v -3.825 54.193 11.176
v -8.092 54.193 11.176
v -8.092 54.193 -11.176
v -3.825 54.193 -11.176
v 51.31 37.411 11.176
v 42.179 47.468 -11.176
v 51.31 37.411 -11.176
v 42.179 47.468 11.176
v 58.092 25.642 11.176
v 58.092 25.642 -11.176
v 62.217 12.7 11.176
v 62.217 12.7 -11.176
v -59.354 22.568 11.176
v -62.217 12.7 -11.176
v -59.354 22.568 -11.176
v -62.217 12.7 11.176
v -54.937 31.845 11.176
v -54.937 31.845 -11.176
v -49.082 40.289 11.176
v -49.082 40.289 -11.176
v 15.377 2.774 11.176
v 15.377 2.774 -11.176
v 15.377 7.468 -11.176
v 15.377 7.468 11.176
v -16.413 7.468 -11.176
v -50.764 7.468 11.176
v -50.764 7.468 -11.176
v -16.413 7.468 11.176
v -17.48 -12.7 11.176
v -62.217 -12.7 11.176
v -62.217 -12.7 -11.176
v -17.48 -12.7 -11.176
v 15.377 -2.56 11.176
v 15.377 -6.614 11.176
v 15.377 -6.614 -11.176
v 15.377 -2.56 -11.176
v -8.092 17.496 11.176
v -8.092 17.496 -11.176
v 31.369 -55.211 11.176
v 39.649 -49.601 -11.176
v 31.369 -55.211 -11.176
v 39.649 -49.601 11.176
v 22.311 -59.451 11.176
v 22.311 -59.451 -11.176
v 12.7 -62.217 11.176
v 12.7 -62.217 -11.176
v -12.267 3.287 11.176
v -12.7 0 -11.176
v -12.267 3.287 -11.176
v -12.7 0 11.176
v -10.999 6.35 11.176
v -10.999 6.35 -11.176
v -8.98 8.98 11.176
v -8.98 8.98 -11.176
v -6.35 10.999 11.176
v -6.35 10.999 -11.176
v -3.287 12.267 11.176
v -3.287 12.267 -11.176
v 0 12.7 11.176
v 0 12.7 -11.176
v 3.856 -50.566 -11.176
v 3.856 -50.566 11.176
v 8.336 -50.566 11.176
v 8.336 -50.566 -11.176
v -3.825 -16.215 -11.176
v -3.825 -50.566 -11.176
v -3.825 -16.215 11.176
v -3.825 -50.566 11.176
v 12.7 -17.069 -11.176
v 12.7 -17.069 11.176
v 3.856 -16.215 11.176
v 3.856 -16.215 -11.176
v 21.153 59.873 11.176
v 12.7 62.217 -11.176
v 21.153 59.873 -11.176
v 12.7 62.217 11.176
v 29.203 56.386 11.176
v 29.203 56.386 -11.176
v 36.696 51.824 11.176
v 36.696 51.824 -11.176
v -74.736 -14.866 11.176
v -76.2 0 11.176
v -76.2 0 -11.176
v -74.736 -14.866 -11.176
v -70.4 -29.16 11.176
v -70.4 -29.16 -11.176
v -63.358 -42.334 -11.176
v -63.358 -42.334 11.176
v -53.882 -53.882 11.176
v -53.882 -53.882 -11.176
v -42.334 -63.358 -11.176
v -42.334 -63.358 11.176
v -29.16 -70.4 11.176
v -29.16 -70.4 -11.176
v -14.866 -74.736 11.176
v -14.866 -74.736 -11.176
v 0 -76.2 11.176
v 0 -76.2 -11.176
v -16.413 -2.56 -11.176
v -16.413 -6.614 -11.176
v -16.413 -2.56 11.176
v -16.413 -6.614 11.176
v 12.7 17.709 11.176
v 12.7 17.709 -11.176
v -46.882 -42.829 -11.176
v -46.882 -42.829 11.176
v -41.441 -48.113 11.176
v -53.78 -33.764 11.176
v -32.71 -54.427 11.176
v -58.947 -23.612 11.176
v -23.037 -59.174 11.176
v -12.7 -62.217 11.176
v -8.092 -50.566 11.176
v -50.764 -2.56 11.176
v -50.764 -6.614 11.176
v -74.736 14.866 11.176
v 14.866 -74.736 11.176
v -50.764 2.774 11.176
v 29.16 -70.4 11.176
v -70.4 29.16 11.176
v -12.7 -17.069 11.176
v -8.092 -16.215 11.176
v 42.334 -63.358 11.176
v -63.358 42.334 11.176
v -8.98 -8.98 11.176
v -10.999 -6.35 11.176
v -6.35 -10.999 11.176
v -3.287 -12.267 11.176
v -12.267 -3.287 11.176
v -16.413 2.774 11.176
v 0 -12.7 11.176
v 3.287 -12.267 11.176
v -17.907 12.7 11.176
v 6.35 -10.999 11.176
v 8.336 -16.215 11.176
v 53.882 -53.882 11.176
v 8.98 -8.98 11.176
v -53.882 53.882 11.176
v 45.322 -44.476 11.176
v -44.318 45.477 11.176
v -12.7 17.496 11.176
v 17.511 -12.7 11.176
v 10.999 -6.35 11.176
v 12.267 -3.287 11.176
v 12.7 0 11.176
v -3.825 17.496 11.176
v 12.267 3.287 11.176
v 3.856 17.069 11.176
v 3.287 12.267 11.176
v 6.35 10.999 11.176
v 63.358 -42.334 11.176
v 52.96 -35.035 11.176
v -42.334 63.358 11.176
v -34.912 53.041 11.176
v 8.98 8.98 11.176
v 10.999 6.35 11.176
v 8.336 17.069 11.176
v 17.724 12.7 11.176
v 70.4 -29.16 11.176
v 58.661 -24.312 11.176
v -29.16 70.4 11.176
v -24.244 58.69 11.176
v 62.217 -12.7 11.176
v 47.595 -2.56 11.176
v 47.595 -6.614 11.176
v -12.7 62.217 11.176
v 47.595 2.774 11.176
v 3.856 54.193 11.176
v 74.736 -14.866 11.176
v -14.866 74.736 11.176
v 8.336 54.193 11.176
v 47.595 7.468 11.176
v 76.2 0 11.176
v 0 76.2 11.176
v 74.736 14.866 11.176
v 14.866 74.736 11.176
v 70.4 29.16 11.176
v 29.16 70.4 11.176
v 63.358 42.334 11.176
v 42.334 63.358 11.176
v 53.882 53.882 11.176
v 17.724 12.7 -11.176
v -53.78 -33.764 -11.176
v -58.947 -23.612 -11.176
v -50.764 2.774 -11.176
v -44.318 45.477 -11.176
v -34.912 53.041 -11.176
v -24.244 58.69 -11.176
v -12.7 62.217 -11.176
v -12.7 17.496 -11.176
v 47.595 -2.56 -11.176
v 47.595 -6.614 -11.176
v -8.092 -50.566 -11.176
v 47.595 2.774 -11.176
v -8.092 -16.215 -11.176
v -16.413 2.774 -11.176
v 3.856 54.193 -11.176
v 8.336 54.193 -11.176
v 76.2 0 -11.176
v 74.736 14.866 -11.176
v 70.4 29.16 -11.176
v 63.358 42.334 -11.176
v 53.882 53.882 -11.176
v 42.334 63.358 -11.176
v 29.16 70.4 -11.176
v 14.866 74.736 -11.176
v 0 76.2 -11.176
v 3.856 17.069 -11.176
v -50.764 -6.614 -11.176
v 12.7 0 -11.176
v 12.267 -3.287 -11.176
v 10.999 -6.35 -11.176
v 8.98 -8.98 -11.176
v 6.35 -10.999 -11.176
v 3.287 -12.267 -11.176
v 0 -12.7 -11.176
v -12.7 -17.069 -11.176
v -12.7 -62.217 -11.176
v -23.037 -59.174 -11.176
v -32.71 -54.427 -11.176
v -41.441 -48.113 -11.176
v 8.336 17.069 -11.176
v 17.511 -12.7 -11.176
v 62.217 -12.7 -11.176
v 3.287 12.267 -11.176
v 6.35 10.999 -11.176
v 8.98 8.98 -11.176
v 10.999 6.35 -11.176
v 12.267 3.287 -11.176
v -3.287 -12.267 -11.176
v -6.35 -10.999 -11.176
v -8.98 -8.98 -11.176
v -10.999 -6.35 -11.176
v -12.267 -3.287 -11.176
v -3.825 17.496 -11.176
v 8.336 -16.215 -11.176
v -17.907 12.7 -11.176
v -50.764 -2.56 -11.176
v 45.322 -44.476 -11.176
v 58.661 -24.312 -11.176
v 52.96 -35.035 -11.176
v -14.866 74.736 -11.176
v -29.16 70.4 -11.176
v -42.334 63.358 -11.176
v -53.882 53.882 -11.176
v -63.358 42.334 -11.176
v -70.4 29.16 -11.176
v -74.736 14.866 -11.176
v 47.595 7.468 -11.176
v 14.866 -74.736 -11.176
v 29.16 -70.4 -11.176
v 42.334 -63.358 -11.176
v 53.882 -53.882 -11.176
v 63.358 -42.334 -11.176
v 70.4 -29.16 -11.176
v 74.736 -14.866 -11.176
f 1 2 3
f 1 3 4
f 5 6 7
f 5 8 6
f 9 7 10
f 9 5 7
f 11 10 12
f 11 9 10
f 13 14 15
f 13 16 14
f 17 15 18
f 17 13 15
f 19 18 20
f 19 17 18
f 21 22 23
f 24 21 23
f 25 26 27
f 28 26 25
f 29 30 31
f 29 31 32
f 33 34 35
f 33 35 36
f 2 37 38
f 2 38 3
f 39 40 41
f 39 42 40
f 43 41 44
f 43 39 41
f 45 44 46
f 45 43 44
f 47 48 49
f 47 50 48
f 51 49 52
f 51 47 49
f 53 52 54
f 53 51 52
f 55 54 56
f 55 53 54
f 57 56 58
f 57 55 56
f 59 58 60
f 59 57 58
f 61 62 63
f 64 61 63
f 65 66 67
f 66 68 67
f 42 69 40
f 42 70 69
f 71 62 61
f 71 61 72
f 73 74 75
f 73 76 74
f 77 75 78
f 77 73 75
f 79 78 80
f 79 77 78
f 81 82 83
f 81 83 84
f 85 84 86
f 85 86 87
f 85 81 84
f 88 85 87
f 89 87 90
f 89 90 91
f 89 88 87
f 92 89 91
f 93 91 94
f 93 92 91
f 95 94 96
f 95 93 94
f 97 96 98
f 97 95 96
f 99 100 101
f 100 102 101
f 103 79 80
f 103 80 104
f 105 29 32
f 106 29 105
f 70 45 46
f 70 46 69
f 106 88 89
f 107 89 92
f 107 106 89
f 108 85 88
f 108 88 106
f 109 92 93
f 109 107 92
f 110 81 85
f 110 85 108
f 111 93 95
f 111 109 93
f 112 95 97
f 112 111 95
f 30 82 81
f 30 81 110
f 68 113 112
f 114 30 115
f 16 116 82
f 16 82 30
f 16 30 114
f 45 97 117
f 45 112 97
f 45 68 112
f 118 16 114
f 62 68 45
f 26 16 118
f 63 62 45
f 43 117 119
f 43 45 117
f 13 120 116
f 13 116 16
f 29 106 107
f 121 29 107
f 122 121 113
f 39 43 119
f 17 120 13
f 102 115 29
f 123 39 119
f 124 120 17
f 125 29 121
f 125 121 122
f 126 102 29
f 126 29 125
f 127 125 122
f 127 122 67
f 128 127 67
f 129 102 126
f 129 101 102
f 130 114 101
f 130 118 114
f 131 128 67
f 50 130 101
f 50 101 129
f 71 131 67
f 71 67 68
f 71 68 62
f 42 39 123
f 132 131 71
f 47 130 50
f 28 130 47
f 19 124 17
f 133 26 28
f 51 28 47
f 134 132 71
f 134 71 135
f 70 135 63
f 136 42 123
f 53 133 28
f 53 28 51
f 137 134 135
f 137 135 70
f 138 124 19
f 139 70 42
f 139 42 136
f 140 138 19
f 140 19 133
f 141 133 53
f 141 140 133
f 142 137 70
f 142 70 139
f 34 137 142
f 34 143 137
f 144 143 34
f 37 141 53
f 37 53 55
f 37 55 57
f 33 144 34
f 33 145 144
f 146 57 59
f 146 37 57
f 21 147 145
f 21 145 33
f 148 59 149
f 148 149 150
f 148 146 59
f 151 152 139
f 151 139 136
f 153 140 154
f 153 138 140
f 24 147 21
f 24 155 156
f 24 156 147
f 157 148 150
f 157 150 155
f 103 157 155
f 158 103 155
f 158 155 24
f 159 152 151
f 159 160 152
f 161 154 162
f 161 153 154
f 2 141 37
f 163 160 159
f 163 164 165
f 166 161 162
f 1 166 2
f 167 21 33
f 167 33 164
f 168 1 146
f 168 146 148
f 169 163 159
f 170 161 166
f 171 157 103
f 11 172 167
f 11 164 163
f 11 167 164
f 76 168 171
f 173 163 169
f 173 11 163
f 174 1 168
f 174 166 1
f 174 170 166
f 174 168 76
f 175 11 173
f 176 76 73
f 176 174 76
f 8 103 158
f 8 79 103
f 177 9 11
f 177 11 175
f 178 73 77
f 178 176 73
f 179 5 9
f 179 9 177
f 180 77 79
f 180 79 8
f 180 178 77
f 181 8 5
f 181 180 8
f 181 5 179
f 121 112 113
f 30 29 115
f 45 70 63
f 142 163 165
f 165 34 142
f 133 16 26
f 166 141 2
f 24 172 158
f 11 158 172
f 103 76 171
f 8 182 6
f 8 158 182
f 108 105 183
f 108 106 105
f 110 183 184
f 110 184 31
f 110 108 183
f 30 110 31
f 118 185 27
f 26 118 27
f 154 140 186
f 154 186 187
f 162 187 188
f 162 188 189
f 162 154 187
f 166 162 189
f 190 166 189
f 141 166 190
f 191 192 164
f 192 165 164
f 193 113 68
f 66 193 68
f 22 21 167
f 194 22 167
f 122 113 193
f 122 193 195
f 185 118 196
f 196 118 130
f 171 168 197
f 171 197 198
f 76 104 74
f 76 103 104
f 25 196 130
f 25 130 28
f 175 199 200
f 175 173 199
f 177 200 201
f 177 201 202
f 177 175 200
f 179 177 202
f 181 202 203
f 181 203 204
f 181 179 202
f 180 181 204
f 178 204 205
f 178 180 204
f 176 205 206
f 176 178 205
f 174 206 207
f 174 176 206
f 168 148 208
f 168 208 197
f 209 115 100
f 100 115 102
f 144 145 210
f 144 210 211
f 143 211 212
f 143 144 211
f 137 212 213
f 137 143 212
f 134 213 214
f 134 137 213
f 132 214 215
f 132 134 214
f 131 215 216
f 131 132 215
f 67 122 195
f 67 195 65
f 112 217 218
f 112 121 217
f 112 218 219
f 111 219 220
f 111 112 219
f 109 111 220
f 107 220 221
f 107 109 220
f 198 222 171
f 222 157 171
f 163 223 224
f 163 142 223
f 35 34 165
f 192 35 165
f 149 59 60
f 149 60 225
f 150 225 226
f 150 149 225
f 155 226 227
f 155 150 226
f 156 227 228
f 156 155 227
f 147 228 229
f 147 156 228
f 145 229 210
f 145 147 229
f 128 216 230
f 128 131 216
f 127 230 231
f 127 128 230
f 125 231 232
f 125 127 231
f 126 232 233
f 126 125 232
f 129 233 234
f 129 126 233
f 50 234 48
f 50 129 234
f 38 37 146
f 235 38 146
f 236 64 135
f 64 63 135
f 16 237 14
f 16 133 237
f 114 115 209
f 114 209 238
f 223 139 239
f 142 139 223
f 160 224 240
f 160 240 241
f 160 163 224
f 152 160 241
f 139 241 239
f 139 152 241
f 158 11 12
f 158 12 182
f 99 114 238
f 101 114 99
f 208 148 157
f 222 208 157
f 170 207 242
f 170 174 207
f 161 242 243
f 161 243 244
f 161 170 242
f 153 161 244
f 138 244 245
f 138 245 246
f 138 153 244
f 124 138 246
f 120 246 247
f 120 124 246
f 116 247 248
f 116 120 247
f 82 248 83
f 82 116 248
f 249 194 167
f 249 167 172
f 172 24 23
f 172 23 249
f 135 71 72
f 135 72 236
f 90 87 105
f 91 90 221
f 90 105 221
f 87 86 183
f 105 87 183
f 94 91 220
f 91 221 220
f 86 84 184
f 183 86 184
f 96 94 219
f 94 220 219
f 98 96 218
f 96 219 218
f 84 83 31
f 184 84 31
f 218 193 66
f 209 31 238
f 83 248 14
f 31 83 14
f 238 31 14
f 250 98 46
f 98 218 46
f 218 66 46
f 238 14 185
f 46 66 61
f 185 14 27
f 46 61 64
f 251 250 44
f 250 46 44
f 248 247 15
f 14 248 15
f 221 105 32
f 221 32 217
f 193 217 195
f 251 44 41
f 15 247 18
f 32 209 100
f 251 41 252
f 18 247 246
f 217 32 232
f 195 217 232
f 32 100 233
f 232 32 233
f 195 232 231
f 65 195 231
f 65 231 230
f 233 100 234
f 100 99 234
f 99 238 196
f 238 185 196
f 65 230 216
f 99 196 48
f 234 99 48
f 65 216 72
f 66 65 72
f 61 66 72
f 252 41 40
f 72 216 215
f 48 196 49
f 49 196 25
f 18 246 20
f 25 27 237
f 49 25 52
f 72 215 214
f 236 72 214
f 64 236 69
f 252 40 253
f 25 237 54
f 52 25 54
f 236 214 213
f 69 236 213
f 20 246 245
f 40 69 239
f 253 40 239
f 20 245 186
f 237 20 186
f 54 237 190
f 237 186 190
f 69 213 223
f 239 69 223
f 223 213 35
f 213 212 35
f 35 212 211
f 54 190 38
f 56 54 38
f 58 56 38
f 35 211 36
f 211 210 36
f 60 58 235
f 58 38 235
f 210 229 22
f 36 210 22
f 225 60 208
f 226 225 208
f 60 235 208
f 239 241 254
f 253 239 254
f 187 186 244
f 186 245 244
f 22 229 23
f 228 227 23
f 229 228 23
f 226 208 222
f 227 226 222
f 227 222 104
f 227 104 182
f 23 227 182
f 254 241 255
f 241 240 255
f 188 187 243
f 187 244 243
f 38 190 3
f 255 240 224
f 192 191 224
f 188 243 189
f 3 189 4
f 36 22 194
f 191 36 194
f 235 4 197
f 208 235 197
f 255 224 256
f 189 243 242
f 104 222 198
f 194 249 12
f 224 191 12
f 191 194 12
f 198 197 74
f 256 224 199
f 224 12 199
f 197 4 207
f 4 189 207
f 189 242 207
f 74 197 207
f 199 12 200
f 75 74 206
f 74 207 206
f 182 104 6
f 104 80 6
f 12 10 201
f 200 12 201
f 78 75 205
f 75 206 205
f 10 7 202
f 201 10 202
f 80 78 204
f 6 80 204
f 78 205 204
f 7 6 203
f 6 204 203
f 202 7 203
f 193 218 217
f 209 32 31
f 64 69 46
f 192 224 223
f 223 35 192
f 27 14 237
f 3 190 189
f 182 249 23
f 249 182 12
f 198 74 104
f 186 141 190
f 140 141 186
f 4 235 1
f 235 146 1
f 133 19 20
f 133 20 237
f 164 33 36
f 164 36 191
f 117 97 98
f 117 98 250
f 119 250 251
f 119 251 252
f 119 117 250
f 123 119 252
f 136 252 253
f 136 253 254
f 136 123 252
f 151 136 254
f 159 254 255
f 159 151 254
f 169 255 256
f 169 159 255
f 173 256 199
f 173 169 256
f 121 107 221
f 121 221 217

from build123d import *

# Parameters (mm, degrees)
F0_W     = 34.350958
F0_H     = 4.69392
F0_W_2   = 4.2672
F0_H_2   = 36.697921
F0_W_3   = 32.217363
F0_W_4   = 4.480557
F0_H_3   = 37.12464
F0_H_4   = 34.350963
F0_H_5   = 4.05384
F1_DEPTH = 11.176


with BuildPart() as f1:
    # F0 (on Top) → F1 (new body, symmetric)
    with BuildSketch(Plane.XY):
        with BuildLine():
            ThreePointArc((-12.7, 0), (-8.980256, 8.980256), (0, 12.7))
            Line((0, 12.7), (0, 76.2))
            ThreePointArc((0, 76.2), (-53.881537, 53.881537), (-76.2, 0))
            Line((-76.2, 0), (-12.7, 0))
        make_face()
        with BuildLine():
            Line((-49.08218, 40.288828), (-17.906999, 12.7))
            Line((-17.906999, 12.7), (-62.217039, 12.7))
            ThreePointArc((-62.217039, 12.7), (-57.333802, 27.296247), (-49.08218, 40.288828))
        make_face(mode=Mode.SUBTRACT)
        with Locations((-33.588959, 5.12064)):
            Rectangle(F0_W, F0_H, mode=Mode.SUBTRACT)
        with Locations((-5.958838, 35.844481)):
            Rectangle(F0_W_2, F0_H_2, mode=Mode.SUBTRACT)
        with BuildLine():
            ThreePointArc((-44.31846, 45.476633), (-29.712564, 56.119636), (-12.7, 62.217039))
            Line((-12.7, 62.217039), (-12.7, 17.49552))
            Line((-12.7, 17.49552), (-44.31846, 45.476633))
        make_face(mode=Mode.SUBTRACT)
        with BuildLine():
            ThreePointArc((0, 12.7), (8.980256, 8.980256), (12.7, 0))
            Line((12.7, 0), (76.2, 0))
            ThreePointArc((76.2, 0), (53.881537, 53.881537), (0, 76.2))
            Line((0, 76.2), (0, 12.7))
        make_face()
        with Locations((31.485843, 5.12064)):
            Rectangle(F0_W_3, F0_H, mode=Mode.SUBTRACT)
        with Locations((6.096001, 35.631121)):
            Rectangle(F0_W_4, F0_H_3, mode=Mode.SUBTRACT)
        with BuildLine():
            Line((62.217039, 12.7), (17.724123, 12.7))
            Line((17.724123, 12.7), (42.179105, 47.467601))
            ThreePointArc((42.179105, 47.467601), (55.016682, 31.708276), (62.217039, 12.7))
        make_face(mode=Mode.SUBTRACT)
        with BuildLine():
            Line((36.695692, 51.82351), (12.7, 17.708881))
            Line((12.7, 17.708881), (12.7, 62.217039))
            ThreePointArc((12.7, 62.217039), (25.23866, 58.26886), (36.695692, 51.82351))
        make_face(mode=Mode.SUBTRACT)
        with BuildLine():
            Line((76.2, 0), (12.7, 0))
            ThreePointArc((12.7, 0), (8.980256, -8.980256), (0, -12.7))
            Line((0, -12.7), (0, -76.2))
            ThreePointArc((0, -76.2), (53.881537, -53.881537), (76.2, 0))
        make_face()
        with BuildLine():
            Line((12.7, -62.217039), (12.7, -17.068801))
            Line((12.7, -17.068801), (39.648922, -49.600534))
            ThreePointArc((39.648922, -49.600534), (26.923901, -57.509595), (12.7, -62.217039))
        make_face(mode=Mode.SUBTRACT)
        with Locations((6.096001, -33.390842)):
            Rectangle(F0_W_4, F0_H_4, mode=Mode.SUBTRACT)
        with Locations((31.485843, -4.58724)):
            Rectangle(F0_W_3, F0_H_5, mode=Mode.SUBTRACT)
        with BuildLine():
            Line((45.322148, -44.476431), (17.510762, -12.7))
            Line((17.510762, -12.7), (62.217039, -12.7))
            ThreePointArc((62.217039, -12.7), (56.067857, -29.810156), (45.322148, -44.476431))
        make_face(mode=Mode.SUBTRACT)
        with BuildLine():
            Line((0, -76.2), (0, -12.7))
            ThreePointArc((0, -12.7), (-8.980256, -8.980256), (-12.7, 0))
            Line((-12.7, 0), (-76.2, 0))
            ThreePointArc((-76.2, 0), (-53.881537, -53.881537), (0, -76.2))
        make_face()
        with BuildLine():
            Line((-41.441198, -48.11317), (-12.7, -17.068801))
            Line((-12.7, -17.068801), (-12.7, -62.217039))
            ThreePointArc((-12.7, -62.217039), (-27.974043, -57.006165), (-41.441198, -48.11317))
        make_face(mode=Mode.SUBTRACT)
        with BuildLine():
            Line((-62.217039, -12.7), (-17.48028, -12.7))
            Line((-17.48028, -12.7), (-46.881881, -42.829186))
            ThreePointArc((-46.881881, -42.829186), (-56.591392, -28.803896), (-62.217039, -12.7))
        make_face(mode=Mode.SUBTRACT)
        with Locations((-5.958838, -33.390842)):
            Rectangle(F0_W_2, F0_H_4, mode=Mode.SUBTRACT)
        with Locations((-33.588959, -4.58724)):
            Rectangle(F0_W, F0_H_5, mode=Mode.SUBTRACT)
    extrude(amount=F1_DEPTH, both=True)


solid = f1.part
